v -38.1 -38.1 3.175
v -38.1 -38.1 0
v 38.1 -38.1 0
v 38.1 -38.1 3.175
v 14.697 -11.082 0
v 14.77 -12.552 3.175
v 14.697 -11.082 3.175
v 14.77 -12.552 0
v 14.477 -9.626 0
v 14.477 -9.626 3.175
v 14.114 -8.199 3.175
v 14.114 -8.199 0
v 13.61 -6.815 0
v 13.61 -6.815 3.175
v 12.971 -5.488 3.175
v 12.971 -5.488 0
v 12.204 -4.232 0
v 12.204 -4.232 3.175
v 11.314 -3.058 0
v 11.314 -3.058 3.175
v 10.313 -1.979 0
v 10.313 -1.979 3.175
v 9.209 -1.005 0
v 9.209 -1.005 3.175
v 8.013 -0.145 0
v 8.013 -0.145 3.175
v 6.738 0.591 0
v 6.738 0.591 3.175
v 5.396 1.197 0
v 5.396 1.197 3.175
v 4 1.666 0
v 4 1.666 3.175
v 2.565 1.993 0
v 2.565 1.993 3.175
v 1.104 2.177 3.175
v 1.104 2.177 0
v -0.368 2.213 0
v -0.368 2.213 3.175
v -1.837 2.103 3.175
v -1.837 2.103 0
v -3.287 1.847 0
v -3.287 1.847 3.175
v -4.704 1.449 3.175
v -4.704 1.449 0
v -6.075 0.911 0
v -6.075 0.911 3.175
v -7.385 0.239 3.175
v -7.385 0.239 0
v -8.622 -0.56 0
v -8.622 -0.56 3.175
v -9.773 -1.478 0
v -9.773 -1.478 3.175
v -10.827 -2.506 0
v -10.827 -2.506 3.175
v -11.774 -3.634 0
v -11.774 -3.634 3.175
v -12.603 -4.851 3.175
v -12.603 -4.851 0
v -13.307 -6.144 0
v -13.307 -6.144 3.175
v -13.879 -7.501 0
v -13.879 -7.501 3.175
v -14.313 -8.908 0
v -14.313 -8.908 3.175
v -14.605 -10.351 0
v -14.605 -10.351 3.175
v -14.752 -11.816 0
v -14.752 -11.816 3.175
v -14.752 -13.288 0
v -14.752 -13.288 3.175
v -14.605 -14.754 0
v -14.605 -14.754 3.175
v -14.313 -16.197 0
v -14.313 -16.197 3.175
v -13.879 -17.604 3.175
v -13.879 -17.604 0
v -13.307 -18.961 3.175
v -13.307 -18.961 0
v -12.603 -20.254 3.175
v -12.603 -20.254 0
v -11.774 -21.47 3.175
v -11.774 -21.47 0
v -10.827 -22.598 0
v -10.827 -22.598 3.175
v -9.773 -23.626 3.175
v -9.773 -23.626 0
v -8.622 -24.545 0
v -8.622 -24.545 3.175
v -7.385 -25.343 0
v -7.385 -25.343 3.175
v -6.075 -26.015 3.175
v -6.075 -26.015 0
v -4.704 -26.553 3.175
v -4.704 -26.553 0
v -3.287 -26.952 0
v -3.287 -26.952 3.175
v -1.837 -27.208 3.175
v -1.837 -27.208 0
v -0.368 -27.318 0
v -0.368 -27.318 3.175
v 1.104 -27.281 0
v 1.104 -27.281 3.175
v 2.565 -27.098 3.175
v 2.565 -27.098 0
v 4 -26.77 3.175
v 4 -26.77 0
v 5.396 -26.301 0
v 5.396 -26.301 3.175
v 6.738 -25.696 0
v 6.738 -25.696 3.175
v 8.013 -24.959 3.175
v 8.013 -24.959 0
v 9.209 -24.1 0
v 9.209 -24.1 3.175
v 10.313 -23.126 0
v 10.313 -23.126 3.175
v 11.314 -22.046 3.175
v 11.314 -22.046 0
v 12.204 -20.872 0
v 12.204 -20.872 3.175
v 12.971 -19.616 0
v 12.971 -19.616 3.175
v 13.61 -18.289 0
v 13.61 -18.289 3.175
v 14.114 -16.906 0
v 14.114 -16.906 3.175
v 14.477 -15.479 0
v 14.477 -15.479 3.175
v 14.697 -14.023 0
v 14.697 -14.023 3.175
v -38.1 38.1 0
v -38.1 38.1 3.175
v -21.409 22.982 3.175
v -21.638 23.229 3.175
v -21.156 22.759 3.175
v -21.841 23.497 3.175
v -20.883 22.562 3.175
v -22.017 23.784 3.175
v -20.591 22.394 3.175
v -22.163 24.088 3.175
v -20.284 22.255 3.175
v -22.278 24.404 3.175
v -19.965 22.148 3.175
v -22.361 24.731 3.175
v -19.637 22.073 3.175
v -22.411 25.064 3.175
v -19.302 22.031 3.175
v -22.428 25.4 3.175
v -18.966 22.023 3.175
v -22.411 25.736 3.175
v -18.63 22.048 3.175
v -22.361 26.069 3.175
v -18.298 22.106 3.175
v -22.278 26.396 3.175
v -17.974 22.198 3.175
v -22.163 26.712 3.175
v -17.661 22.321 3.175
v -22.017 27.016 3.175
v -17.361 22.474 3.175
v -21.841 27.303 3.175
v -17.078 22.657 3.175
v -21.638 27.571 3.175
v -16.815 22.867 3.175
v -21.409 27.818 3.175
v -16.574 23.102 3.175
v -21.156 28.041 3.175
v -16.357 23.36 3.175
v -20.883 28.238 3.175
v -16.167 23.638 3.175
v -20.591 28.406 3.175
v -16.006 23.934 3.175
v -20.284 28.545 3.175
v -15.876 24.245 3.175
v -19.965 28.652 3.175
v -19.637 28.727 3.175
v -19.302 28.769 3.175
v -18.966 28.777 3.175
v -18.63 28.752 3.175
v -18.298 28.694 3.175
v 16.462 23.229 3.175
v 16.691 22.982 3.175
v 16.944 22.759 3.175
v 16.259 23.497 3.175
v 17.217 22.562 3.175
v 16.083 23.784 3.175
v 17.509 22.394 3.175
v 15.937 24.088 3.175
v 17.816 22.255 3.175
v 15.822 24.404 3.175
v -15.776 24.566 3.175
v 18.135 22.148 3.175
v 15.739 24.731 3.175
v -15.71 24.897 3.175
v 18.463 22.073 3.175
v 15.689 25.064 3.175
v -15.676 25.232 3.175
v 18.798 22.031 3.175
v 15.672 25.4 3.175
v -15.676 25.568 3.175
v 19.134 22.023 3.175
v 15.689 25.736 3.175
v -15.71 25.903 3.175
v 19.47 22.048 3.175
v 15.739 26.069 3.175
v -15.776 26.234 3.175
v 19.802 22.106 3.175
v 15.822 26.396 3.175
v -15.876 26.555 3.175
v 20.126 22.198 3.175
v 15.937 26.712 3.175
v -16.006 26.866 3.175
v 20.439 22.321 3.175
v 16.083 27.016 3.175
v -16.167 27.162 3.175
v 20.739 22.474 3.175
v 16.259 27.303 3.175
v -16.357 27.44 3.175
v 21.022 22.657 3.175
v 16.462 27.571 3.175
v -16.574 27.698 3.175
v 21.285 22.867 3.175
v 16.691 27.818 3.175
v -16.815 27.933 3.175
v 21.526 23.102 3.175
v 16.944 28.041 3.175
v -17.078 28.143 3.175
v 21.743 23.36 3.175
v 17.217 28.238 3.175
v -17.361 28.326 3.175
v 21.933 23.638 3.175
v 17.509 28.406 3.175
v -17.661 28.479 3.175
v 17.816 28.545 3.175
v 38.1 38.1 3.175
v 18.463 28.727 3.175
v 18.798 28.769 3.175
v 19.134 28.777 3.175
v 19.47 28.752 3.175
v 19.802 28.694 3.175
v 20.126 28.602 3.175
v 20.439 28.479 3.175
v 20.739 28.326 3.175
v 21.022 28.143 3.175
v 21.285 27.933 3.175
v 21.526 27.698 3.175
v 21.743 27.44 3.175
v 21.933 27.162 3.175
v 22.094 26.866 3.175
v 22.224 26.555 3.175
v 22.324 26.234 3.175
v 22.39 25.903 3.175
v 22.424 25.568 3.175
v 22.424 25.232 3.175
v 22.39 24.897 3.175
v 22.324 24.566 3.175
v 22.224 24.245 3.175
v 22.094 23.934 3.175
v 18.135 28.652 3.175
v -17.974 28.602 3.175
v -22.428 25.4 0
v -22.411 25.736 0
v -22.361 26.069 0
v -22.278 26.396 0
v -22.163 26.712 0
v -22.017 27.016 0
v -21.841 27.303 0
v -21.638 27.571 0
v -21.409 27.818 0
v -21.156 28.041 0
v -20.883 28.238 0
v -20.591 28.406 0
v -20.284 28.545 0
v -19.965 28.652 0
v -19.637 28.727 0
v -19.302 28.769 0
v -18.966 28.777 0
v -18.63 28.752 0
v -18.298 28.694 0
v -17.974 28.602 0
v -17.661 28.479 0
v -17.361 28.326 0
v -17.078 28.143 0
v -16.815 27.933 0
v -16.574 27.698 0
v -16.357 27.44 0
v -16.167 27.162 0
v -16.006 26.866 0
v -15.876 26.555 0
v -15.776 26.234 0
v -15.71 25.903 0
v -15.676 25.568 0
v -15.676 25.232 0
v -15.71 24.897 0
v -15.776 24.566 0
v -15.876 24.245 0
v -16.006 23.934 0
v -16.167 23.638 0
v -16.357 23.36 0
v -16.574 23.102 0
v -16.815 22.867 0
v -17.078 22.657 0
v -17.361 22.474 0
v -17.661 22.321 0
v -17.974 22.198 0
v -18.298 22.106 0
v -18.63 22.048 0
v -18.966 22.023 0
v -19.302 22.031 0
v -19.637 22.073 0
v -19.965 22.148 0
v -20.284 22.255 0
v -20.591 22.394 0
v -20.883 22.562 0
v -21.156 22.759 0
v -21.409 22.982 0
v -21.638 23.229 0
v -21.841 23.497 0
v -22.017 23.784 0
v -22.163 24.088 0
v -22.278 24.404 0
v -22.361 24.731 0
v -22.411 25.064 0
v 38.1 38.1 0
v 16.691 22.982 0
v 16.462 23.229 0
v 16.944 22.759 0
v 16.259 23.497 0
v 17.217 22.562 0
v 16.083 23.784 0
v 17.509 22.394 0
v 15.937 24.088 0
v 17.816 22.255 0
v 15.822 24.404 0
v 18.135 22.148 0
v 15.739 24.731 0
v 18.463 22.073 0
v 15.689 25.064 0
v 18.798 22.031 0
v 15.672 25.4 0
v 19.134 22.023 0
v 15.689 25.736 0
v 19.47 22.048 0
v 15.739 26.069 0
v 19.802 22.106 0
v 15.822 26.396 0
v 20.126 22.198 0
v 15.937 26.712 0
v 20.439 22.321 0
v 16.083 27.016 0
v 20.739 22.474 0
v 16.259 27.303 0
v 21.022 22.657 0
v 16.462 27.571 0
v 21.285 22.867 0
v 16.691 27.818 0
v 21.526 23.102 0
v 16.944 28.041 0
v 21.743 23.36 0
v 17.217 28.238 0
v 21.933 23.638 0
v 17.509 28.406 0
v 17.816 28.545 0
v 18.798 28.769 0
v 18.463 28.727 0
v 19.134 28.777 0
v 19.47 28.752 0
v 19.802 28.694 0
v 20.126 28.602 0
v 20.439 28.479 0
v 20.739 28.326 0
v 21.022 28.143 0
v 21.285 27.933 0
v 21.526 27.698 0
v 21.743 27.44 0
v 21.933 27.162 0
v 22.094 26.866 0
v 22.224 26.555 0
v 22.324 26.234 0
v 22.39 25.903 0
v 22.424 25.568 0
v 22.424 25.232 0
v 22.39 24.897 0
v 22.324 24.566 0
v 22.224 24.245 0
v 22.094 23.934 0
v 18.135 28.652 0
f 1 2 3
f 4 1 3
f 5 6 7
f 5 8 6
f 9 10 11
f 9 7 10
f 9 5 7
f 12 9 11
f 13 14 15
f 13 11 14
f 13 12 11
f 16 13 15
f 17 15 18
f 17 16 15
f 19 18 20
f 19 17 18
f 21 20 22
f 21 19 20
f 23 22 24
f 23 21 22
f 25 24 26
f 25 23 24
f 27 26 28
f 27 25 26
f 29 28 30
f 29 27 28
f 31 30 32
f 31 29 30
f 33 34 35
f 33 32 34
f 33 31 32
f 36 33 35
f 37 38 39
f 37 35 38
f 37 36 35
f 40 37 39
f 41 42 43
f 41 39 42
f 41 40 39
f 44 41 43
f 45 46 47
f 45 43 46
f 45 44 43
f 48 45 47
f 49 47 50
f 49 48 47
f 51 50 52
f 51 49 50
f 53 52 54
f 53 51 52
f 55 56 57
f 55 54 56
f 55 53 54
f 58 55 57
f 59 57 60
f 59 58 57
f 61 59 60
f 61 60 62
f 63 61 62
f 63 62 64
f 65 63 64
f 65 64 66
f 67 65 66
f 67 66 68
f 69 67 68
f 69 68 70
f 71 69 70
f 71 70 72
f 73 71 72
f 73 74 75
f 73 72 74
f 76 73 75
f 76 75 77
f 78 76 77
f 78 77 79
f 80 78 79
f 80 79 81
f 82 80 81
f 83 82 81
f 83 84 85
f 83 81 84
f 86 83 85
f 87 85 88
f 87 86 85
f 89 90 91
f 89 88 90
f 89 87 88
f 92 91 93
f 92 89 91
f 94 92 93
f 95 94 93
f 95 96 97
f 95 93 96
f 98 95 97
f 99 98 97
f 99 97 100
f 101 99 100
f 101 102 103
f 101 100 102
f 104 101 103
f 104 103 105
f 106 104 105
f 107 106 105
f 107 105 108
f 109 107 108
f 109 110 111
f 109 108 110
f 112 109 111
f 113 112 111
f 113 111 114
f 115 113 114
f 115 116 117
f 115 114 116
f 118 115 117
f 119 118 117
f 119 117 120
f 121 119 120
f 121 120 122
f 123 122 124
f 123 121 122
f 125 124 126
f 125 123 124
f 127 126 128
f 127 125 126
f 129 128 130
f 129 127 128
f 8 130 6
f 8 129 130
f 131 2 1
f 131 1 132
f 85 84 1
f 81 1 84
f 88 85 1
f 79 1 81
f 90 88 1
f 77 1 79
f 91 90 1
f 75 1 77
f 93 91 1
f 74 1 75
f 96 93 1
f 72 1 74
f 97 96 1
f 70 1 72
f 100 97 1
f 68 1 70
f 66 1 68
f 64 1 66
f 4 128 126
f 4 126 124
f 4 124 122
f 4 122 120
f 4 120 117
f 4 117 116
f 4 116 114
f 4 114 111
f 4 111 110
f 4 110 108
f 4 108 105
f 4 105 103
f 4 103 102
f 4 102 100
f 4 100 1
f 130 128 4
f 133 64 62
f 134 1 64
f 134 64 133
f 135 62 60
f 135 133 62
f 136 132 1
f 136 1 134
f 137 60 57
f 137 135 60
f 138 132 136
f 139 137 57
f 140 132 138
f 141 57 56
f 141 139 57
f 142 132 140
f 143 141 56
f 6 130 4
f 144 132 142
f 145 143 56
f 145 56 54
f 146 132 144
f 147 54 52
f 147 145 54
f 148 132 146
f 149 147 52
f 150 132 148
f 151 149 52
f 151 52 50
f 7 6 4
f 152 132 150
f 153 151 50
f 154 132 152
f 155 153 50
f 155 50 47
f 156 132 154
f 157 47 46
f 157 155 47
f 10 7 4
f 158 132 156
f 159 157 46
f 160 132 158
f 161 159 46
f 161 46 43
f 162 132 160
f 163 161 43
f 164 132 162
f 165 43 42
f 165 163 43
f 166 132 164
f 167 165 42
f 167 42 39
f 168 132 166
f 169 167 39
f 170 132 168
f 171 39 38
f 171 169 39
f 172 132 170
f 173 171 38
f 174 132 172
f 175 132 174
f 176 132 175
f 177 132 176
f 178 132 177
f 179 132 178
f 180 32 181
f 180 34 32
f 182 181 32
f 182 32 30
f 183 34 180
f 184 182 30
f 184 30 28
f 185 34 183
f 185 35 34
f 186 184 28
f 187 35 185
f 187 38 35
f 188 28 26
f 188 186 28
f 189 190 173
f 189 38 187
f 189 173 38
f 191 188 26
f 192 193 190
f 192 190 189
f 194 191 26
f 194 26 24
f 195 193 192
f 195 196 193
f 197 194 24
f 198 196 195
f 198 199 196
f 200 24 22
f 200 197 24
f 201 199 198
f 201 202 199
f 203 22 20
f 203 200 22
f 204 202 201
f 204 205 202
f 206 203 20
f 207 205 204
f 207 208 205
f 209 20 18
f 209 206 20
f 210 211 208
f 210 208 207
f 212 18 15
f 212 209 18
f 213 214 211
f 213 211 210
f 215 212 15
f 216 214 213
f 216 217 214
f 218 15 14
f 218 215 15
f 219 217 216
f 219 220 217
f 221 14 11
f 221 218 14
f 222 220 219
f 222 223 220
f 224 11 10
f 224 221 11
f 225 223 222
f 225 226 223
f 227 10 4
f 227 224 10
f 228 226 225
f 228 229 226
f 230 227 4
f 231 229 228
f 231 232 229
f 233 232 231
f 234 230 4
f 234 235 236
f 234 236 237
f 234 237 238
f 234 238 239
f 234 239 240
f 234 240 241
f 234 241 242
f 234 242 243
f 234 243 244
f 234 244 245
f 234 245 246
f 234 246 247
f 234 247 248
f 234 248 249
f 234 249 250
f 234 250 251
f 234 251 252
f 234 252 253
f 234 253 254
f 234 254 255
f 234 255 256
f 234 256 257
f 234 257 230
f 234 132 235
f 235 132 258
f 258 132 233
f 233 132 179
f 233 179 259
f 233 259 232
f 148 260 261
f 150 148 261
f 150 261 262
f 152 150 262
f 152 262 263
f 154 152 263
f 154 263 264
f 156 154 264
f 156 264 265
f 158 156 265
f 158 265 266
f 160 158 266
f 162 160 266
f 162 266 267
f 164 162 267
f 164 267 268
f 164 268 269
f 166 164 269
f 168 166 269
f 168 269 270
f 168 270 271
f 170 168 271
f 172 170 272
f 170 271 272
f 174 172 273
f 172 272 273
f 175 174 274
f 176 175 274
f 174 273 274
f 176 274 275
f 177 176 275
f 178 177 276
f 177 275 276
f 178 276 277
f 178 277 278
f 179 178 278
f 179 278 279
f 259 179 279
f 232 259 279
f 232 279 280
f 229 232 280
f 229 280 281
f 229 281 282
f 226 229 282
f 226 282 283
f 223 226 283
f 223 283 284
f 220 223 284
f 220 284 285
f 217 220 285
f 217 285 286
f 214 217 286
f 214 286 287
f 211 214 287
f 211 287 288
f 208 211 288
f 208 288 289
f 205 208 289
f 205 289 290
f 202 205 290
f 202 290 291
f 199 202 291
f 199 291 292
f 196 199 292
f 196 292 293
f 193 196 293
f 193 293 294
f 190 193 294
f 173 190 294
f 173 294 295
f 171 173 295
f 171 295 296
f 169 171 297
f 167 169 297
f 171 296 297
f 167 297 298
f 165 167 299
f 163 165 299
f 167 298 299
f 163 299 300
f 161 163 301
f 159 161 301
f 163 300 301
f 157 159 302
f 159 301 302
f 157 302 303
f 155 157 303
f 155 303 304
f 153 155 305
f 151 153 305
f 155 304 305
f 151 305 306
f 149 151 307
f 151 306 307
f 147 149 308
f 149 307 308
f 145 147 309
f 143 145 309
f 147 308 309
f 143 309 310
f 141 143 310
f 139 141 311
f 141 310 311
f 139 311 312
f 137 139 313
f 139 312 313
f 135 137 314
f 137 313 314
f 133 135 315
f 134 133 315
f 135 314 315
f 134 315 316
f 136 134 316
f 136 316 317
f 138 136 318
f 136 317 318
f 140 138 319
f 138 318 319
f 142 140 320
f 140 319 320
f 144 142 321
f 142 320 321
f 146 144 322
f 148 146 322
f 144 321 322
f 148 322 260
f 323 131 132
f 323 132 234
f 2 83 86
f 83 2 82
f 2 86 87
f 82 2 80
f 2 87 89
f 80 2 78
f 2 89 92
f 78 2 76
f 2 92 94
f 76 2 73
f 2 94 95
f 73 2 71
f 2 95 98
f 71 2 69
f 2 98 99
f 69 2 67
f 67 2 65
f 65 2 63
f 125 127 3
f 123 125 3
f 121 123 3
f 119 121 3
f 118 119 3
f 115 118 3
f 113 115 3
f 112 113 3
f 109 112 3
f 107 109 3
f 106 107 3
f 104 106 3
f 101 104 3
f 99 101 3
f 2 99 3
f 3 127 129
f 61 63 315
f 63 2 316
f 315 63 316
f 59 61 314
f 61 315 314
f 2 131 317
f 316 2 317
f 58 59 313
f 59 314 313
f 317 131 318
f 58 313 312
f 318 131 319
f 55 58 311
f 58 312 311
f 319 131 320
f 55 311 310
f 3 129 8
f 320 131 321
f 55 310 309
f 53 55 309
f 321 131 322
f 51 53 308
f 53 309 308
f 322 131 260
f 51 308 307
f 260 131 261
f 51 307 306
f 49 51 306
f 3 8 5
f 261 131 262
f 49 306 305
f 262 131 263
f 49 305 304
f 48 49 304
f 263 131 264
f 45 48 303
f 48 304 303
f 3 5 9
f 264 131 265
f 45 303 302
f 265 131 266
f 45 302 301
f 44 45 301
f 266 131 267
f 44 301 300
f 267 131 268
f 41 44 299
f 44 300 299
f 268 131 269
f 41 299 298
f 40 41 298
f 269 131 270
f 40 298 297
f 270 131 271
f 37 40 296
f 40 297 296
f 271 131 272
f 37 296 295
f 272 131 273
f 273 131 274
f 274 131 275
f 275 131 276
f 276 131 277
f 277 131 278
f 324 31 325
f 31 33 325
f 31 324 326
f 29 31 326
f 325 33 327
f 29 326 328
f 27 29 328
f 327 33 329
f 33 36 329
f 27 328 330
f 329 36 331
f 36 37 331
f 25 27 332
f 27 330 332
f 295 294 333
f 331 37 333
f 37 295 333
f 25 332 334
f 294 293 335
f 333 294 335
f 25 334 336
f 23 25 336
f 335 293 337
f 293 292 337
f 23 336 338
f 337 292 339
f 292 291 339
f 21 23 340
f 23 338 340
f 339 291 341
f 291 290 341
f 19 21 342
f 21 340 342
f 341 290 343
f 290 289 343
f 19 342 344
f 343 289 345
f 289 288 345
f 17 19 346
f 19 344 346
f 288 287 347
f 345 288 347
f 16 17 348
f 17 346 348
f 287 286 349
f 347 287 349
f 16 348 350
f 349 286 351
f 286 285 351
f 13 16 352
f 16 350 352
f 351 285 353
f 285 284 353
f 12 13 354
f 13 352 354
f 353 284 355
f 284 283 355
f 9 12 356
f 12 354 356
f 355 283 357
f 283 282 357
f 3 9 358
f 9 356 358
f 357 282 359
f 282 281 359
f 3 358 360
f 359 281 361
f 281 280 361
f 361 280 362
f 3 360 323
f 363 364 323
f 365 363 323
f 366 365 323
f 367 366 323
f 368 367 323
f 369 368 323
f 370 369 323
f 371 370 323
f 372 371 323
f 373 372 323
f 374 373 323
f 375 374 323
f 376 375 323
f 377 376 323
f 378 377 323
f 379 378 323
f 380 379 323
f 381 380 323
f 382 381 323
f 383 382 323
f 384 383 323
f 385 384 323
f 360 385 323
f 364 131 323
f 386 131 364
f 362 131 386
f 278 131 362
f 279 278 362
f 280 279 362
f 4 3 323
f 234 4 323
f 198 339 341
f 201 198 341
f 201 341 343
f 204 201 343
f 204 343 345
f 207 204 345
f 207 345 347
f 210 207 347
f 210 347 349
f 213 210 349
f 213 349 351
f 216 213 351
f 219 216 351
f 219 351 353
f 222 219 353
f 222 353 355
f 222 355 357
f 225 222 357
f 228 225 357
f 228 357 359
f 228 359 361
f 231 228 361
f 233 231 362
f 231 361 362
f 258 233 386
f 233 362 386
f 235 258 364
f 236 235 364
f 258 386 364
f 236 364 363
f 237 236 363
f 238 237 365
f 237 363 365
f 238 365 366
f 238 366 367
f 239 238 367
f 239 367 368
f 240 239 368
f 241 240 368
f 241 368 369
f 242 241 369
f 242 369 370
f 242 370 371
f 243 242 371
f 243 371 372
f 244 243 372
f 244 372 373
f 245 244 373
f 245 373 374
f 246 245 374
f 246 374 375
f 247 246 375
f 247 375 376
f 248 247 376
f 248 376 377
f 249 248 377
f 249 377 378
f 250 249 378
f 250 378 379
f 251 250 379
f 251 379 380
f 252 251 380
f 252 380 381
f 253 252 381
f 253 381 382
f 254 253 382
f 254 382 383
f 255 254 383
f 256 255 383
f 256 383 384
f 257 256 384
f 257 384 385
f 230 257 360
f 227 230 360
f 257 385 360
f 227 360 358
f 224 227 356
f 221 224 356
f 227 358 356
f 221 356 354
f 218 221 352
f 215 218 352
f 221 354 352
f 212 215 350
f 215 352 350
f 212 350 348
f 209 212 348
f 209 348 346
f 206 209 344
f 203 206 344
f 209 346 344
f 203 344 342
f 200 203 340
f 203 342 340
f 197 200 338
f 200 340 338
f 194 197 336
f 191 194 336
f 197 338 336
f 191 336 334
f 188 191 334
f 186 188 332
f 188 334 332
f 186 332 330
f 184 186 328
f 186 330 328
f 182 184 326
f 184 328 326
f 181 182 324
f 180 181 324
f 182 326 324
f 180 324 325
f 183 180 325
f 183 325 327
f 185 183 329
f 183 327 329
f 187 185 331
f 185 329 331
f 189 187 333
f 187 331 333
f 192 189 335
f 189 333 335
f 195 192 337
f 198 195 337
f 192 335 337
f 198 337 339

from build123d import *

# Parameters (mm, degrees)
SKETCH1_W               = 76.2
SKETCH1_H               = 76.2
BOSS_EXTRUDE1_DEPTH     = 3.175
F_1_4_CLEARANCE_HOLE1_D = 6.7564
CUT_EXTRUDE1_DEPTH      = 54.975
CUT_EXTRUDE1_DEPTH_BACK = 54.975
SKETCH4_R               = 14.77


with BuildPart() as part:
    # Sketch1 → Boss-Extrude1 (new body)
    with BuildSketch(Plane.XY):
        Rectangle(SKETCH1_W, SKETCH1_H)
    extrude(amount=BOSS_EXTRUDE1_DEPTH)

    # 1/4 Clearance Hole1 (through all)
    with Locations(Plane.XY.offset(3.175)):
        with Locations((19.05, 25.4), (-19.05, 25.4)):
            Hole(F_1_4_CLEARANCE_HOLE1_D / 2)

    # Sketch4 → Cut-Extrude1 (cut, two sides: drawn at the far end of the back side and taken through both)
    with BuildSketch(Plane.XY.offset(3.175).offset(-CUT_EXTRUDE1_DEPTH_BACK)):
        with Locations((0, -12.552196451)):
            Circle(SKETCH4_R)
    extrude(amount=CUT_EXTRUDE1_DEPTH + CUT_EXTRUDE1_DEPTH_BACK, mode=Mode.SUBTRACT)


solid = part.part
